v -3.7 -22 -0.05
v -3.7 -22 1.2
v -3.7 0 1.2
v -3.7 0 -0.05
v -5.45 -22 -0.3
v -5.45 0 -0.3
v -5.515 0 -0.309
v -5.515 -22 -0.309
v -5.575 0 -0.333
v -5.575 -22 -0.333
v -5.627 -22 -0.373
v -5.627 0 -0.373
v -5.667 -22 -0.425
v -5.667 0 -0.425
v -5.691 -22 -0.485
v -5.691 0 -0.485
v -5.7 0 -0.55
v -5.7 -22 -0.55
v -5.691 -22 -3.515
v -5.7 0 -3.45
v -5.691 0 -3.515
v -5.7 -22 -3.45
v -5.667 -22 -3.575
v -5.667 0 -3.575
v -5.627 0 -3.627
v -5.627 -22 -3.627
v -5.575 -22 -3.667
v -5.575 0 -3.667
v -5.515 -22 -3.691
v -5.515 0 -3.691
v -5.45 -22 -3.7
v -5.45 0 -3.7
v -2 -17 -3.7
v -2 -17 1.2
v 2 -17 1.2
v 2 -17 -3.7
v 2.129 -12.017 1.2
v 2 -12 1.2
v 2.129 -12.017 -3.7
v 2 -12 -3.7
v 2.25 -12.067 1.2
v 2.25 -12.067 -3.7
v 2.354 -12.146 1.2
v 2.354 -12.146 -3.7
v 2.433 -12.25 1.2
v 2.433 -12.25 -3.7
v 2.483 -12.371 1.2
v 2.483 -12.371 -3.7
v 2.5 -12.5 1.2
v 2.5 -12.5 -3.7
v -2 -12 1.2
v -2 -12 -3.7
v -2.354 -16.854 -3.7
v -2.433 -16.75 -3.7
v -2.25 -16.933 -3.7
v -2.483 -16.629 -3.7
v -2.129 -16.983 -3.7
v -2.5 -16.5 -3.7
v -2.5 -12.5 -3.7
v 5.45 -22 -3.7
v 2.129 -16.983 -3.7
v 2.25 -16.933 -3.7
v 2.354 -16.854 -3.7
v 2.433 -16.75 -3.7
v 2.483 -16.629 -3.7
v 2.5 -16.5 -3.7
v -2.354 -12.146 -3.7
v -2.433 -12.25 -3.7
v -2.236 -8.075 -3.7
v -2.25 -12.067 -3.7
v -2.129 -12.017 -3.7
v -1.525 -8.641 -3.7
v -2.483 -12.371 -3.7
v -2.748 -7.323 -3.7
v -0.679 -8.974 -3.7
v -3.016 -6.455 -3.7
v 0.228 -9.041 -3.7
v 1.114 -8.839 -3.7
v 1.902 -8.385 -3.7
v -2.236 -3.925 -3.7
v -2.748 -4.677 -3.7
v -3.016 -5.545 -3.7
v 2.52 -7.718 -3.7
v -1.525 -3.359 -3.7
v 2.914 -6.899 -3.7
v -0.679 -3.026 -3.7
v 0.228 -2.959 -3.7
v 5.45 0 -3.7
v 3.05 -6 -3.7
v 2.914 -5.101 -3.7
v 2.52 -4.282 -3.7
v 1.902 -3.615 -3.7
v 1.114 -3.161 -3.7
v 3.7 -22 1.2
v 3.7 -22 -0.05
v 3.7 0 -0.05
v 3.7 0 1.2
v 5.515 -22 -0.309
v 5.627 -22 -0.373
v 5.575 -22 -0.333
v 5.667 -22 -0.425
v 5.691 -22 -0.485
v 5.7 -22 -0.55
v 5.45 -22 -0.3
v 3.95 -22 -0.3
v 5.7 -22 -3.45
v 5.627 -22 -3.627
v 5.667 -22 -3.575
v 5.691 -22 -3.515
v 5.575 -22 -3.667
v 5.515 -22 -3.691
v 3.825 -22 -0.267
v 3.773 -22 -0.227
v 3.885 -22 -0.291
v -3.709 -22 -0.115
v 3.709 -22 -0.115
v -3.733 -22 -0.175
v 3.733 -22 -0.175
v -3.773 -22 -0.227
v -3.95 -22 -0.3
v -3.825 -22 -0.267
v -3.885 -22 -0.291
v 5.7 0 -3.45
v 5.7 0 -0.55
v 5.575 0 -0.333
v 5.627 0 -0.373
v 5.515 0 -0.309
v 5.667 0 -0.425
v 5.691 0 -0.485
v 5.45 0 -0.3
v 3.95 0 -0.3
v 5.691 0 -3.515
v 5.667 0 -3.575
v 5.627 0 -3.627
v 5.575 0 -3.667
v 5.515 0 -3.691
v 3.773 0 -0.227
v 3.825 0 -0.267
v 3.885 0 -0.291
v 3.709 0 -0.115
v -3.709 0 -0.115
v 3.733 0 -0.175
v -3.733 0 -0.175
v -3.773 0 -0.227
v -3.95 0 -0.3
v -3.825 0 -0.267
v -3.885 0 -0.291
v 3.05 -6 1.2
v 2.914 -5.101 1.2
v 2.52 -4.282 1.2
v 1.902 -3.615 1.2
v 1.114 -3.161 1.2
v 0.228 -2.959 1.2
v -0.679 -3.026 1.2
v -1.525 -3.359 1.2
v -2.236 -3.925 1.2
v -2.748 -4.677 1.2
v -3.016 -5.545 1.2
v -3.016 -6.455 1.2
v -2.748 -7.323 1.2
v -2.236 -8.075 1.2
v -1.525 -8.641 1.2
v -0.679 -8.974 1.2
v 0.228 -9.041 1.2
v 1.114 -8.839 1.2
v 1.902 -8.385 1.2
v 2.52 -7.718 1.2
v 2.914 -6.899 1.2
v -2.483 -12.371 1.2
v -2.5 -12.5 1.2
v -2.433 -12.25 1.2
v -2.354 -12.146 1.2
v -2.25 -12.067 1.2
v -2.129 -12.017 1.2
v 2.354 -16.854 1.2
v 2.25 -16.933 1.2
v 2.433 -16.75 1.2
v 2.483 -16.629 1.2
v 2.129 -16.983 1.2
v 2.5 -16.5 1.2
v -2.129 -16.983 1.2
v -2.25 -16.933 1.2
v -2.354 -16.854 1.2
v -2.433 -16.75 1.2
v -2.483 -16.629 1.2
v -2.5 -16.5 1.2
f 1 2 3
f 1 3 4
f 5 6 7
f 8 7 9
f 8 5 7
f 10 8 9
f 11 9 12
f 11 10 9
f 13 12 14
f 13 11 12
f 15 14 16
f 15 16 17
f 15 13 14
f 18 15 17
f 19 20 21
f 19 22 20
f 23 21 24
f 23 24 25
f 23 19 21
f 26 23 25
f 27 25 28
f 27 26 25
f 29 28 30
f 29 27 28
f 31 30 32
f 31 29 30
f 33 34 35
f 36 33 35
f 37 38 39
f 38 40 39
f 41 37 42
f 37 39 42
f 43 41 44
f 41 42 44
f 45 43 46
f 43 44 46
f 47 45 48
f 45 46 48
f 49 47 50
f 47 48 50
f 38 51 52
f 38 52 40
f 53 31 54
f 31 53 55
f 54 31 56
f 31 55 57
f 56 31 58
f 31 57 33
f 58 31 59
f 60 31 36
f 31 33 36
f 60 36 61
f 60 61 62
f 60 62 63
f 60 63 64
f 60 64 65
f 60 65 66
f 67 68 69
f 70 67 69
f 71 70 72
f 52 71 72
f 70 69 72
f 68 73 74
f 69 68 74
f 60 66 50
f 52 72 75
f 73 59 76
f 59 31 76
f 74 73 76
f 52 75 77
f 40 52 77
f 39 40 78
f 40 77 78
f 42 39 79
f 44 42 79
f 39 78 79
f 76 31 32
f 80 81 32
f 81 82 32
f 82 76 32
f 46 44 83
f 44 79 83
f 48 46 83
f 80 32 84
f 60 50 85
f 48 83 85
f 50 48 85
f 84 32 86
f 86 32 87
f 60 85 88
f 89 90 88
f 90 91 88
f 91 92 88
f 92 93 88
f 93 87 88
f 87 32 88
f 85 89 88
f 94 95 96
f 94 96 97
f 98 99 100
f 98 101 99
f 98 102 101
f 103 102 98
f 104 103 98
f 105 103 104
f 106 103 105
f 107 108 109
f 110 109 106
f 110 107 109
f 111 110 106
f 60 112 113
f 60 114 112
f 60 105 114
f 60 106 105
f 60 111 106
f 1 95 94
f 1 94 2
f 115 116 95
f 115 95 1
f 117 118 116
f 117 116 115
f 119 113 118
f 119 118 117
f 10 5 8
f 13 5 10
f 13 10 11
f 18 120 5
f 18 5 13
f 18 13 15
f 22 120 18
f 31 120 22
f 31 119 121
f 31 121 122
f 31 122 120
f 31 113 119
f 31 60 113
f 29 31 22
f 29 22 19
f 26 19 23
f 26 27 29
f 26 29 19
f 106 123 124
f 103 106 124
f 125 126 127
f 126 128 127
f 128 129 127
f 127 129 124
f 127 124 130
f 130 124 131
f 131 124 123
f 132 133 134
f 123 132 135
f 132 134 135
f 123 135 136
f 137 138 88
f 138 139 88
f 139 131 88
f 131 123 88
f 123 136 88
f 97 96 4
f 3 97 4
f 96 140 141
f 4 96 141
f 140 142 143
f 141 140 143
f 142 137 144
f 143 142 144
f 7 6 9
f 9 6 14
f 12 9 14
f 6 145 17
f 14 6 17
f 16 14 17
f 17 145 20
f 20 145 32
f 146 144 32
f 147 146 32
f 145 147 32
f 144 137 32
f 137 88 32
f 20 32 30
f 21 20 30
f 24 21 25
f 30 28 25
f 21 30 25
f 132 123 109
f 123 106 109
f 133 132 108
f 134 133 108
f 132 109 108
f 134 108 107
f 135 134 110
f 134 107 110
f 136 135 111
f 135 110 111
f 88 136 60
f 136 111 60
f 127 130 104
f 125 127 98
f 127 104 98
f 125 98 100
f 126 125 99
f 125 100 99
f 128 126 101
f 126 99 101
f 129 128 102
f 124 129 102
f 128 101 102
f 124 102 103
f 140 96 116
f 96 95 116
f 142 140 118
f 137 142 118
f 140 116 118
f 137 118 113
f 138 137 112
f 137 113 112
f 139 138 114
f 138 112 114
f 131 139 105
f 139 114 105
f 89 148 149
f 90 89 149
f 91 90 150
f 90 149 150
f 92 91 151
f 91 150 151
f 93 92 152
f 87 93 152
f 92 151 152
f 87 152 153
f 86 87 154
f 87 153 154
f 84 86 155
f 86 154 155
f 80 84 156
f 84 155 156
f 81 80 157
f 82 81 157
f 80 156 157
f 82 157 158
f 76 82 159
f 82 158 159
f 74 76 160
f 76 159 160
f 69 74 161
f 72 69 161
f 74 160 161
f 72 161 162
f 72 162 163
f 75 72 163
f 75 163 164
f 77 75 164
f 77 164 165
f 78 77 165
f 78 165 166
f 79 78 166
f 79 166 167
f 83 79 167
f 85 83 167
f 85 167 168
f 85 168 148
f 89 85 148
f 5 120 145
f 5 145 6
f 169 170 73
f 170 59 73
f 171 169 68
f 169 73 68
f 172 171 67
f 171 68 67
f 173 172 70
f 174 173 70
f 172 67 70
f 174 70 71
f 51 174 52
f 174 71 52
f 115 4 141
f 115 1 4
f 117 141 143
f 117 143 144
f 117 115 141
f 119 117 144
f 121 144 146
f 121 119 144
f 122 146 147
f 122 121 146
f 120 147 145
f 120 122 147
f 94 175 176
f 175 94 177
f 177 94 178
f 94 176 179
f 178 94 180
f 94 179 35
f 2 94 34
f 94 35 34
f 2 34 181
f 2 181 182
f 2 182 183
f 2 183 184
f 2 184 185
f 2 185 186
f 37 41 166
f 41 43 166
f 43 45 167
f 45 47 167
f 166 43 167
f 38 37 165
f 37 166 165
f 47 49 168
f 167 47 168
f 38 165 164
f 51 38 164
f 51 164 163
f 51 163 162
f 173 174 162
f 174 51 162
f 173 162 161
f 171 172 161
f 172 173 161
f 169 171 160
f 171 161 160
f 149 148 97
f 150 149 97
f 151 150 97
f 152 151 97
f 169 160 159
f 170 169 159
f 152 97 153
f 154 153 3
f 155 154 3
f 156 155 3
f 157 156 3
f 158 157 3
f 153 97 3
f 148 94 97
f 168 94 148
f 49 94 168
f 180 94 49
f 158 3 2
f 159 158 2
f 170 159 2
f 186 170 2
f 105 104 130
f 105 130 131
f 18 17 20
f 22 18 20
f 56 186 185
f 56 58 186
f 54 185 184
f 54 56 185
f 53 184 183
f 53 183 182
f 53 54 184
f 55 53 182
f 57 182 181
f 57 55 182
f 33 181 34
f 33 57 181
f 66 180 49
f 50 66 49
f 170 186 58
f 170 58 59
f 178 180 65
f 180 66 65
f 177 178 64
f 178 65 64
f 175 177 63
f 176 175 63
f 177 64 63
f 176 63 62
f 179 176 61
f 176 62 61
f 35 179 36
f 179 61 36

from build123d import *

# Parameters (mm, degrees)
BOSS_EXTRUDE1_DEPTH = 22
SKETCH2_R           = 3.05
SKETCH2_W           = 5
SKETCH2_H           = 5
CUT_EXTRUDE1_DEPTH  = 24.248655875
FILLET1_R           = 0.25
FILLET2_R           = 0.5


with BuildPart() as part:
    # Sketch1 → Boss-Extrude1 (new body)
    with BuildSketch(Plane(origin=(0, 0, 0), x_dir=(1, 0, 0), z_dir=(0, 1, 0))):
        Polygon((3.7, 0.3), (3.7, -1.2), (-3.7, -1.2), (-3.7, 0.3), (-5.7, 0.3), (-5.7, 3.7), (5.7, 3.7), (5.7, 0.3), align=None)
    extrude(amount=-BOSS_EXTRUDE1_DEPTH)

    # Sketch2 → Cut-Extrude1 (cut, through all)
    with BuildSketch(Plane.XY.offset(1.2)):
        with Locations((0, -6)):
            Circle(SKETCH2_R)
        with Locations((0, -14.5)):
            Rectangle(SKETCH2_W, SKETCH2_H)
    extrude(amount=-CUT_EXTRUDE1_DEPTH, mode=Mode.SUBTRACT)

    # Fillet1
    fillet1_edges = [part.edges().sort_by_distance(p)[0] for p in [
        (3.7, -11, -0.3),
        (-3.7, -11, -0.3),
        (-5.7, -11, -0.3),
        (-5.7, -11, -3.7),
        (5.7, -11, -3.7),
        (5.7, -11, -0.3),
    ]]
    fillet(fillet1_edges, radius=FILLET1_R)

    # Fillet2
    fillet2_edges = [part.edges().sort_by_distance(p)[0] for p in [
        (2.5, -12, -1.25),
        (2.5, -17, -1.25),
        (-2.5, -17, -1.25),
        (-2.5, -12, -1.25),
    ]]
    fillet(fillet2_edges, radius=FILLET2_R)


solid = part.part
